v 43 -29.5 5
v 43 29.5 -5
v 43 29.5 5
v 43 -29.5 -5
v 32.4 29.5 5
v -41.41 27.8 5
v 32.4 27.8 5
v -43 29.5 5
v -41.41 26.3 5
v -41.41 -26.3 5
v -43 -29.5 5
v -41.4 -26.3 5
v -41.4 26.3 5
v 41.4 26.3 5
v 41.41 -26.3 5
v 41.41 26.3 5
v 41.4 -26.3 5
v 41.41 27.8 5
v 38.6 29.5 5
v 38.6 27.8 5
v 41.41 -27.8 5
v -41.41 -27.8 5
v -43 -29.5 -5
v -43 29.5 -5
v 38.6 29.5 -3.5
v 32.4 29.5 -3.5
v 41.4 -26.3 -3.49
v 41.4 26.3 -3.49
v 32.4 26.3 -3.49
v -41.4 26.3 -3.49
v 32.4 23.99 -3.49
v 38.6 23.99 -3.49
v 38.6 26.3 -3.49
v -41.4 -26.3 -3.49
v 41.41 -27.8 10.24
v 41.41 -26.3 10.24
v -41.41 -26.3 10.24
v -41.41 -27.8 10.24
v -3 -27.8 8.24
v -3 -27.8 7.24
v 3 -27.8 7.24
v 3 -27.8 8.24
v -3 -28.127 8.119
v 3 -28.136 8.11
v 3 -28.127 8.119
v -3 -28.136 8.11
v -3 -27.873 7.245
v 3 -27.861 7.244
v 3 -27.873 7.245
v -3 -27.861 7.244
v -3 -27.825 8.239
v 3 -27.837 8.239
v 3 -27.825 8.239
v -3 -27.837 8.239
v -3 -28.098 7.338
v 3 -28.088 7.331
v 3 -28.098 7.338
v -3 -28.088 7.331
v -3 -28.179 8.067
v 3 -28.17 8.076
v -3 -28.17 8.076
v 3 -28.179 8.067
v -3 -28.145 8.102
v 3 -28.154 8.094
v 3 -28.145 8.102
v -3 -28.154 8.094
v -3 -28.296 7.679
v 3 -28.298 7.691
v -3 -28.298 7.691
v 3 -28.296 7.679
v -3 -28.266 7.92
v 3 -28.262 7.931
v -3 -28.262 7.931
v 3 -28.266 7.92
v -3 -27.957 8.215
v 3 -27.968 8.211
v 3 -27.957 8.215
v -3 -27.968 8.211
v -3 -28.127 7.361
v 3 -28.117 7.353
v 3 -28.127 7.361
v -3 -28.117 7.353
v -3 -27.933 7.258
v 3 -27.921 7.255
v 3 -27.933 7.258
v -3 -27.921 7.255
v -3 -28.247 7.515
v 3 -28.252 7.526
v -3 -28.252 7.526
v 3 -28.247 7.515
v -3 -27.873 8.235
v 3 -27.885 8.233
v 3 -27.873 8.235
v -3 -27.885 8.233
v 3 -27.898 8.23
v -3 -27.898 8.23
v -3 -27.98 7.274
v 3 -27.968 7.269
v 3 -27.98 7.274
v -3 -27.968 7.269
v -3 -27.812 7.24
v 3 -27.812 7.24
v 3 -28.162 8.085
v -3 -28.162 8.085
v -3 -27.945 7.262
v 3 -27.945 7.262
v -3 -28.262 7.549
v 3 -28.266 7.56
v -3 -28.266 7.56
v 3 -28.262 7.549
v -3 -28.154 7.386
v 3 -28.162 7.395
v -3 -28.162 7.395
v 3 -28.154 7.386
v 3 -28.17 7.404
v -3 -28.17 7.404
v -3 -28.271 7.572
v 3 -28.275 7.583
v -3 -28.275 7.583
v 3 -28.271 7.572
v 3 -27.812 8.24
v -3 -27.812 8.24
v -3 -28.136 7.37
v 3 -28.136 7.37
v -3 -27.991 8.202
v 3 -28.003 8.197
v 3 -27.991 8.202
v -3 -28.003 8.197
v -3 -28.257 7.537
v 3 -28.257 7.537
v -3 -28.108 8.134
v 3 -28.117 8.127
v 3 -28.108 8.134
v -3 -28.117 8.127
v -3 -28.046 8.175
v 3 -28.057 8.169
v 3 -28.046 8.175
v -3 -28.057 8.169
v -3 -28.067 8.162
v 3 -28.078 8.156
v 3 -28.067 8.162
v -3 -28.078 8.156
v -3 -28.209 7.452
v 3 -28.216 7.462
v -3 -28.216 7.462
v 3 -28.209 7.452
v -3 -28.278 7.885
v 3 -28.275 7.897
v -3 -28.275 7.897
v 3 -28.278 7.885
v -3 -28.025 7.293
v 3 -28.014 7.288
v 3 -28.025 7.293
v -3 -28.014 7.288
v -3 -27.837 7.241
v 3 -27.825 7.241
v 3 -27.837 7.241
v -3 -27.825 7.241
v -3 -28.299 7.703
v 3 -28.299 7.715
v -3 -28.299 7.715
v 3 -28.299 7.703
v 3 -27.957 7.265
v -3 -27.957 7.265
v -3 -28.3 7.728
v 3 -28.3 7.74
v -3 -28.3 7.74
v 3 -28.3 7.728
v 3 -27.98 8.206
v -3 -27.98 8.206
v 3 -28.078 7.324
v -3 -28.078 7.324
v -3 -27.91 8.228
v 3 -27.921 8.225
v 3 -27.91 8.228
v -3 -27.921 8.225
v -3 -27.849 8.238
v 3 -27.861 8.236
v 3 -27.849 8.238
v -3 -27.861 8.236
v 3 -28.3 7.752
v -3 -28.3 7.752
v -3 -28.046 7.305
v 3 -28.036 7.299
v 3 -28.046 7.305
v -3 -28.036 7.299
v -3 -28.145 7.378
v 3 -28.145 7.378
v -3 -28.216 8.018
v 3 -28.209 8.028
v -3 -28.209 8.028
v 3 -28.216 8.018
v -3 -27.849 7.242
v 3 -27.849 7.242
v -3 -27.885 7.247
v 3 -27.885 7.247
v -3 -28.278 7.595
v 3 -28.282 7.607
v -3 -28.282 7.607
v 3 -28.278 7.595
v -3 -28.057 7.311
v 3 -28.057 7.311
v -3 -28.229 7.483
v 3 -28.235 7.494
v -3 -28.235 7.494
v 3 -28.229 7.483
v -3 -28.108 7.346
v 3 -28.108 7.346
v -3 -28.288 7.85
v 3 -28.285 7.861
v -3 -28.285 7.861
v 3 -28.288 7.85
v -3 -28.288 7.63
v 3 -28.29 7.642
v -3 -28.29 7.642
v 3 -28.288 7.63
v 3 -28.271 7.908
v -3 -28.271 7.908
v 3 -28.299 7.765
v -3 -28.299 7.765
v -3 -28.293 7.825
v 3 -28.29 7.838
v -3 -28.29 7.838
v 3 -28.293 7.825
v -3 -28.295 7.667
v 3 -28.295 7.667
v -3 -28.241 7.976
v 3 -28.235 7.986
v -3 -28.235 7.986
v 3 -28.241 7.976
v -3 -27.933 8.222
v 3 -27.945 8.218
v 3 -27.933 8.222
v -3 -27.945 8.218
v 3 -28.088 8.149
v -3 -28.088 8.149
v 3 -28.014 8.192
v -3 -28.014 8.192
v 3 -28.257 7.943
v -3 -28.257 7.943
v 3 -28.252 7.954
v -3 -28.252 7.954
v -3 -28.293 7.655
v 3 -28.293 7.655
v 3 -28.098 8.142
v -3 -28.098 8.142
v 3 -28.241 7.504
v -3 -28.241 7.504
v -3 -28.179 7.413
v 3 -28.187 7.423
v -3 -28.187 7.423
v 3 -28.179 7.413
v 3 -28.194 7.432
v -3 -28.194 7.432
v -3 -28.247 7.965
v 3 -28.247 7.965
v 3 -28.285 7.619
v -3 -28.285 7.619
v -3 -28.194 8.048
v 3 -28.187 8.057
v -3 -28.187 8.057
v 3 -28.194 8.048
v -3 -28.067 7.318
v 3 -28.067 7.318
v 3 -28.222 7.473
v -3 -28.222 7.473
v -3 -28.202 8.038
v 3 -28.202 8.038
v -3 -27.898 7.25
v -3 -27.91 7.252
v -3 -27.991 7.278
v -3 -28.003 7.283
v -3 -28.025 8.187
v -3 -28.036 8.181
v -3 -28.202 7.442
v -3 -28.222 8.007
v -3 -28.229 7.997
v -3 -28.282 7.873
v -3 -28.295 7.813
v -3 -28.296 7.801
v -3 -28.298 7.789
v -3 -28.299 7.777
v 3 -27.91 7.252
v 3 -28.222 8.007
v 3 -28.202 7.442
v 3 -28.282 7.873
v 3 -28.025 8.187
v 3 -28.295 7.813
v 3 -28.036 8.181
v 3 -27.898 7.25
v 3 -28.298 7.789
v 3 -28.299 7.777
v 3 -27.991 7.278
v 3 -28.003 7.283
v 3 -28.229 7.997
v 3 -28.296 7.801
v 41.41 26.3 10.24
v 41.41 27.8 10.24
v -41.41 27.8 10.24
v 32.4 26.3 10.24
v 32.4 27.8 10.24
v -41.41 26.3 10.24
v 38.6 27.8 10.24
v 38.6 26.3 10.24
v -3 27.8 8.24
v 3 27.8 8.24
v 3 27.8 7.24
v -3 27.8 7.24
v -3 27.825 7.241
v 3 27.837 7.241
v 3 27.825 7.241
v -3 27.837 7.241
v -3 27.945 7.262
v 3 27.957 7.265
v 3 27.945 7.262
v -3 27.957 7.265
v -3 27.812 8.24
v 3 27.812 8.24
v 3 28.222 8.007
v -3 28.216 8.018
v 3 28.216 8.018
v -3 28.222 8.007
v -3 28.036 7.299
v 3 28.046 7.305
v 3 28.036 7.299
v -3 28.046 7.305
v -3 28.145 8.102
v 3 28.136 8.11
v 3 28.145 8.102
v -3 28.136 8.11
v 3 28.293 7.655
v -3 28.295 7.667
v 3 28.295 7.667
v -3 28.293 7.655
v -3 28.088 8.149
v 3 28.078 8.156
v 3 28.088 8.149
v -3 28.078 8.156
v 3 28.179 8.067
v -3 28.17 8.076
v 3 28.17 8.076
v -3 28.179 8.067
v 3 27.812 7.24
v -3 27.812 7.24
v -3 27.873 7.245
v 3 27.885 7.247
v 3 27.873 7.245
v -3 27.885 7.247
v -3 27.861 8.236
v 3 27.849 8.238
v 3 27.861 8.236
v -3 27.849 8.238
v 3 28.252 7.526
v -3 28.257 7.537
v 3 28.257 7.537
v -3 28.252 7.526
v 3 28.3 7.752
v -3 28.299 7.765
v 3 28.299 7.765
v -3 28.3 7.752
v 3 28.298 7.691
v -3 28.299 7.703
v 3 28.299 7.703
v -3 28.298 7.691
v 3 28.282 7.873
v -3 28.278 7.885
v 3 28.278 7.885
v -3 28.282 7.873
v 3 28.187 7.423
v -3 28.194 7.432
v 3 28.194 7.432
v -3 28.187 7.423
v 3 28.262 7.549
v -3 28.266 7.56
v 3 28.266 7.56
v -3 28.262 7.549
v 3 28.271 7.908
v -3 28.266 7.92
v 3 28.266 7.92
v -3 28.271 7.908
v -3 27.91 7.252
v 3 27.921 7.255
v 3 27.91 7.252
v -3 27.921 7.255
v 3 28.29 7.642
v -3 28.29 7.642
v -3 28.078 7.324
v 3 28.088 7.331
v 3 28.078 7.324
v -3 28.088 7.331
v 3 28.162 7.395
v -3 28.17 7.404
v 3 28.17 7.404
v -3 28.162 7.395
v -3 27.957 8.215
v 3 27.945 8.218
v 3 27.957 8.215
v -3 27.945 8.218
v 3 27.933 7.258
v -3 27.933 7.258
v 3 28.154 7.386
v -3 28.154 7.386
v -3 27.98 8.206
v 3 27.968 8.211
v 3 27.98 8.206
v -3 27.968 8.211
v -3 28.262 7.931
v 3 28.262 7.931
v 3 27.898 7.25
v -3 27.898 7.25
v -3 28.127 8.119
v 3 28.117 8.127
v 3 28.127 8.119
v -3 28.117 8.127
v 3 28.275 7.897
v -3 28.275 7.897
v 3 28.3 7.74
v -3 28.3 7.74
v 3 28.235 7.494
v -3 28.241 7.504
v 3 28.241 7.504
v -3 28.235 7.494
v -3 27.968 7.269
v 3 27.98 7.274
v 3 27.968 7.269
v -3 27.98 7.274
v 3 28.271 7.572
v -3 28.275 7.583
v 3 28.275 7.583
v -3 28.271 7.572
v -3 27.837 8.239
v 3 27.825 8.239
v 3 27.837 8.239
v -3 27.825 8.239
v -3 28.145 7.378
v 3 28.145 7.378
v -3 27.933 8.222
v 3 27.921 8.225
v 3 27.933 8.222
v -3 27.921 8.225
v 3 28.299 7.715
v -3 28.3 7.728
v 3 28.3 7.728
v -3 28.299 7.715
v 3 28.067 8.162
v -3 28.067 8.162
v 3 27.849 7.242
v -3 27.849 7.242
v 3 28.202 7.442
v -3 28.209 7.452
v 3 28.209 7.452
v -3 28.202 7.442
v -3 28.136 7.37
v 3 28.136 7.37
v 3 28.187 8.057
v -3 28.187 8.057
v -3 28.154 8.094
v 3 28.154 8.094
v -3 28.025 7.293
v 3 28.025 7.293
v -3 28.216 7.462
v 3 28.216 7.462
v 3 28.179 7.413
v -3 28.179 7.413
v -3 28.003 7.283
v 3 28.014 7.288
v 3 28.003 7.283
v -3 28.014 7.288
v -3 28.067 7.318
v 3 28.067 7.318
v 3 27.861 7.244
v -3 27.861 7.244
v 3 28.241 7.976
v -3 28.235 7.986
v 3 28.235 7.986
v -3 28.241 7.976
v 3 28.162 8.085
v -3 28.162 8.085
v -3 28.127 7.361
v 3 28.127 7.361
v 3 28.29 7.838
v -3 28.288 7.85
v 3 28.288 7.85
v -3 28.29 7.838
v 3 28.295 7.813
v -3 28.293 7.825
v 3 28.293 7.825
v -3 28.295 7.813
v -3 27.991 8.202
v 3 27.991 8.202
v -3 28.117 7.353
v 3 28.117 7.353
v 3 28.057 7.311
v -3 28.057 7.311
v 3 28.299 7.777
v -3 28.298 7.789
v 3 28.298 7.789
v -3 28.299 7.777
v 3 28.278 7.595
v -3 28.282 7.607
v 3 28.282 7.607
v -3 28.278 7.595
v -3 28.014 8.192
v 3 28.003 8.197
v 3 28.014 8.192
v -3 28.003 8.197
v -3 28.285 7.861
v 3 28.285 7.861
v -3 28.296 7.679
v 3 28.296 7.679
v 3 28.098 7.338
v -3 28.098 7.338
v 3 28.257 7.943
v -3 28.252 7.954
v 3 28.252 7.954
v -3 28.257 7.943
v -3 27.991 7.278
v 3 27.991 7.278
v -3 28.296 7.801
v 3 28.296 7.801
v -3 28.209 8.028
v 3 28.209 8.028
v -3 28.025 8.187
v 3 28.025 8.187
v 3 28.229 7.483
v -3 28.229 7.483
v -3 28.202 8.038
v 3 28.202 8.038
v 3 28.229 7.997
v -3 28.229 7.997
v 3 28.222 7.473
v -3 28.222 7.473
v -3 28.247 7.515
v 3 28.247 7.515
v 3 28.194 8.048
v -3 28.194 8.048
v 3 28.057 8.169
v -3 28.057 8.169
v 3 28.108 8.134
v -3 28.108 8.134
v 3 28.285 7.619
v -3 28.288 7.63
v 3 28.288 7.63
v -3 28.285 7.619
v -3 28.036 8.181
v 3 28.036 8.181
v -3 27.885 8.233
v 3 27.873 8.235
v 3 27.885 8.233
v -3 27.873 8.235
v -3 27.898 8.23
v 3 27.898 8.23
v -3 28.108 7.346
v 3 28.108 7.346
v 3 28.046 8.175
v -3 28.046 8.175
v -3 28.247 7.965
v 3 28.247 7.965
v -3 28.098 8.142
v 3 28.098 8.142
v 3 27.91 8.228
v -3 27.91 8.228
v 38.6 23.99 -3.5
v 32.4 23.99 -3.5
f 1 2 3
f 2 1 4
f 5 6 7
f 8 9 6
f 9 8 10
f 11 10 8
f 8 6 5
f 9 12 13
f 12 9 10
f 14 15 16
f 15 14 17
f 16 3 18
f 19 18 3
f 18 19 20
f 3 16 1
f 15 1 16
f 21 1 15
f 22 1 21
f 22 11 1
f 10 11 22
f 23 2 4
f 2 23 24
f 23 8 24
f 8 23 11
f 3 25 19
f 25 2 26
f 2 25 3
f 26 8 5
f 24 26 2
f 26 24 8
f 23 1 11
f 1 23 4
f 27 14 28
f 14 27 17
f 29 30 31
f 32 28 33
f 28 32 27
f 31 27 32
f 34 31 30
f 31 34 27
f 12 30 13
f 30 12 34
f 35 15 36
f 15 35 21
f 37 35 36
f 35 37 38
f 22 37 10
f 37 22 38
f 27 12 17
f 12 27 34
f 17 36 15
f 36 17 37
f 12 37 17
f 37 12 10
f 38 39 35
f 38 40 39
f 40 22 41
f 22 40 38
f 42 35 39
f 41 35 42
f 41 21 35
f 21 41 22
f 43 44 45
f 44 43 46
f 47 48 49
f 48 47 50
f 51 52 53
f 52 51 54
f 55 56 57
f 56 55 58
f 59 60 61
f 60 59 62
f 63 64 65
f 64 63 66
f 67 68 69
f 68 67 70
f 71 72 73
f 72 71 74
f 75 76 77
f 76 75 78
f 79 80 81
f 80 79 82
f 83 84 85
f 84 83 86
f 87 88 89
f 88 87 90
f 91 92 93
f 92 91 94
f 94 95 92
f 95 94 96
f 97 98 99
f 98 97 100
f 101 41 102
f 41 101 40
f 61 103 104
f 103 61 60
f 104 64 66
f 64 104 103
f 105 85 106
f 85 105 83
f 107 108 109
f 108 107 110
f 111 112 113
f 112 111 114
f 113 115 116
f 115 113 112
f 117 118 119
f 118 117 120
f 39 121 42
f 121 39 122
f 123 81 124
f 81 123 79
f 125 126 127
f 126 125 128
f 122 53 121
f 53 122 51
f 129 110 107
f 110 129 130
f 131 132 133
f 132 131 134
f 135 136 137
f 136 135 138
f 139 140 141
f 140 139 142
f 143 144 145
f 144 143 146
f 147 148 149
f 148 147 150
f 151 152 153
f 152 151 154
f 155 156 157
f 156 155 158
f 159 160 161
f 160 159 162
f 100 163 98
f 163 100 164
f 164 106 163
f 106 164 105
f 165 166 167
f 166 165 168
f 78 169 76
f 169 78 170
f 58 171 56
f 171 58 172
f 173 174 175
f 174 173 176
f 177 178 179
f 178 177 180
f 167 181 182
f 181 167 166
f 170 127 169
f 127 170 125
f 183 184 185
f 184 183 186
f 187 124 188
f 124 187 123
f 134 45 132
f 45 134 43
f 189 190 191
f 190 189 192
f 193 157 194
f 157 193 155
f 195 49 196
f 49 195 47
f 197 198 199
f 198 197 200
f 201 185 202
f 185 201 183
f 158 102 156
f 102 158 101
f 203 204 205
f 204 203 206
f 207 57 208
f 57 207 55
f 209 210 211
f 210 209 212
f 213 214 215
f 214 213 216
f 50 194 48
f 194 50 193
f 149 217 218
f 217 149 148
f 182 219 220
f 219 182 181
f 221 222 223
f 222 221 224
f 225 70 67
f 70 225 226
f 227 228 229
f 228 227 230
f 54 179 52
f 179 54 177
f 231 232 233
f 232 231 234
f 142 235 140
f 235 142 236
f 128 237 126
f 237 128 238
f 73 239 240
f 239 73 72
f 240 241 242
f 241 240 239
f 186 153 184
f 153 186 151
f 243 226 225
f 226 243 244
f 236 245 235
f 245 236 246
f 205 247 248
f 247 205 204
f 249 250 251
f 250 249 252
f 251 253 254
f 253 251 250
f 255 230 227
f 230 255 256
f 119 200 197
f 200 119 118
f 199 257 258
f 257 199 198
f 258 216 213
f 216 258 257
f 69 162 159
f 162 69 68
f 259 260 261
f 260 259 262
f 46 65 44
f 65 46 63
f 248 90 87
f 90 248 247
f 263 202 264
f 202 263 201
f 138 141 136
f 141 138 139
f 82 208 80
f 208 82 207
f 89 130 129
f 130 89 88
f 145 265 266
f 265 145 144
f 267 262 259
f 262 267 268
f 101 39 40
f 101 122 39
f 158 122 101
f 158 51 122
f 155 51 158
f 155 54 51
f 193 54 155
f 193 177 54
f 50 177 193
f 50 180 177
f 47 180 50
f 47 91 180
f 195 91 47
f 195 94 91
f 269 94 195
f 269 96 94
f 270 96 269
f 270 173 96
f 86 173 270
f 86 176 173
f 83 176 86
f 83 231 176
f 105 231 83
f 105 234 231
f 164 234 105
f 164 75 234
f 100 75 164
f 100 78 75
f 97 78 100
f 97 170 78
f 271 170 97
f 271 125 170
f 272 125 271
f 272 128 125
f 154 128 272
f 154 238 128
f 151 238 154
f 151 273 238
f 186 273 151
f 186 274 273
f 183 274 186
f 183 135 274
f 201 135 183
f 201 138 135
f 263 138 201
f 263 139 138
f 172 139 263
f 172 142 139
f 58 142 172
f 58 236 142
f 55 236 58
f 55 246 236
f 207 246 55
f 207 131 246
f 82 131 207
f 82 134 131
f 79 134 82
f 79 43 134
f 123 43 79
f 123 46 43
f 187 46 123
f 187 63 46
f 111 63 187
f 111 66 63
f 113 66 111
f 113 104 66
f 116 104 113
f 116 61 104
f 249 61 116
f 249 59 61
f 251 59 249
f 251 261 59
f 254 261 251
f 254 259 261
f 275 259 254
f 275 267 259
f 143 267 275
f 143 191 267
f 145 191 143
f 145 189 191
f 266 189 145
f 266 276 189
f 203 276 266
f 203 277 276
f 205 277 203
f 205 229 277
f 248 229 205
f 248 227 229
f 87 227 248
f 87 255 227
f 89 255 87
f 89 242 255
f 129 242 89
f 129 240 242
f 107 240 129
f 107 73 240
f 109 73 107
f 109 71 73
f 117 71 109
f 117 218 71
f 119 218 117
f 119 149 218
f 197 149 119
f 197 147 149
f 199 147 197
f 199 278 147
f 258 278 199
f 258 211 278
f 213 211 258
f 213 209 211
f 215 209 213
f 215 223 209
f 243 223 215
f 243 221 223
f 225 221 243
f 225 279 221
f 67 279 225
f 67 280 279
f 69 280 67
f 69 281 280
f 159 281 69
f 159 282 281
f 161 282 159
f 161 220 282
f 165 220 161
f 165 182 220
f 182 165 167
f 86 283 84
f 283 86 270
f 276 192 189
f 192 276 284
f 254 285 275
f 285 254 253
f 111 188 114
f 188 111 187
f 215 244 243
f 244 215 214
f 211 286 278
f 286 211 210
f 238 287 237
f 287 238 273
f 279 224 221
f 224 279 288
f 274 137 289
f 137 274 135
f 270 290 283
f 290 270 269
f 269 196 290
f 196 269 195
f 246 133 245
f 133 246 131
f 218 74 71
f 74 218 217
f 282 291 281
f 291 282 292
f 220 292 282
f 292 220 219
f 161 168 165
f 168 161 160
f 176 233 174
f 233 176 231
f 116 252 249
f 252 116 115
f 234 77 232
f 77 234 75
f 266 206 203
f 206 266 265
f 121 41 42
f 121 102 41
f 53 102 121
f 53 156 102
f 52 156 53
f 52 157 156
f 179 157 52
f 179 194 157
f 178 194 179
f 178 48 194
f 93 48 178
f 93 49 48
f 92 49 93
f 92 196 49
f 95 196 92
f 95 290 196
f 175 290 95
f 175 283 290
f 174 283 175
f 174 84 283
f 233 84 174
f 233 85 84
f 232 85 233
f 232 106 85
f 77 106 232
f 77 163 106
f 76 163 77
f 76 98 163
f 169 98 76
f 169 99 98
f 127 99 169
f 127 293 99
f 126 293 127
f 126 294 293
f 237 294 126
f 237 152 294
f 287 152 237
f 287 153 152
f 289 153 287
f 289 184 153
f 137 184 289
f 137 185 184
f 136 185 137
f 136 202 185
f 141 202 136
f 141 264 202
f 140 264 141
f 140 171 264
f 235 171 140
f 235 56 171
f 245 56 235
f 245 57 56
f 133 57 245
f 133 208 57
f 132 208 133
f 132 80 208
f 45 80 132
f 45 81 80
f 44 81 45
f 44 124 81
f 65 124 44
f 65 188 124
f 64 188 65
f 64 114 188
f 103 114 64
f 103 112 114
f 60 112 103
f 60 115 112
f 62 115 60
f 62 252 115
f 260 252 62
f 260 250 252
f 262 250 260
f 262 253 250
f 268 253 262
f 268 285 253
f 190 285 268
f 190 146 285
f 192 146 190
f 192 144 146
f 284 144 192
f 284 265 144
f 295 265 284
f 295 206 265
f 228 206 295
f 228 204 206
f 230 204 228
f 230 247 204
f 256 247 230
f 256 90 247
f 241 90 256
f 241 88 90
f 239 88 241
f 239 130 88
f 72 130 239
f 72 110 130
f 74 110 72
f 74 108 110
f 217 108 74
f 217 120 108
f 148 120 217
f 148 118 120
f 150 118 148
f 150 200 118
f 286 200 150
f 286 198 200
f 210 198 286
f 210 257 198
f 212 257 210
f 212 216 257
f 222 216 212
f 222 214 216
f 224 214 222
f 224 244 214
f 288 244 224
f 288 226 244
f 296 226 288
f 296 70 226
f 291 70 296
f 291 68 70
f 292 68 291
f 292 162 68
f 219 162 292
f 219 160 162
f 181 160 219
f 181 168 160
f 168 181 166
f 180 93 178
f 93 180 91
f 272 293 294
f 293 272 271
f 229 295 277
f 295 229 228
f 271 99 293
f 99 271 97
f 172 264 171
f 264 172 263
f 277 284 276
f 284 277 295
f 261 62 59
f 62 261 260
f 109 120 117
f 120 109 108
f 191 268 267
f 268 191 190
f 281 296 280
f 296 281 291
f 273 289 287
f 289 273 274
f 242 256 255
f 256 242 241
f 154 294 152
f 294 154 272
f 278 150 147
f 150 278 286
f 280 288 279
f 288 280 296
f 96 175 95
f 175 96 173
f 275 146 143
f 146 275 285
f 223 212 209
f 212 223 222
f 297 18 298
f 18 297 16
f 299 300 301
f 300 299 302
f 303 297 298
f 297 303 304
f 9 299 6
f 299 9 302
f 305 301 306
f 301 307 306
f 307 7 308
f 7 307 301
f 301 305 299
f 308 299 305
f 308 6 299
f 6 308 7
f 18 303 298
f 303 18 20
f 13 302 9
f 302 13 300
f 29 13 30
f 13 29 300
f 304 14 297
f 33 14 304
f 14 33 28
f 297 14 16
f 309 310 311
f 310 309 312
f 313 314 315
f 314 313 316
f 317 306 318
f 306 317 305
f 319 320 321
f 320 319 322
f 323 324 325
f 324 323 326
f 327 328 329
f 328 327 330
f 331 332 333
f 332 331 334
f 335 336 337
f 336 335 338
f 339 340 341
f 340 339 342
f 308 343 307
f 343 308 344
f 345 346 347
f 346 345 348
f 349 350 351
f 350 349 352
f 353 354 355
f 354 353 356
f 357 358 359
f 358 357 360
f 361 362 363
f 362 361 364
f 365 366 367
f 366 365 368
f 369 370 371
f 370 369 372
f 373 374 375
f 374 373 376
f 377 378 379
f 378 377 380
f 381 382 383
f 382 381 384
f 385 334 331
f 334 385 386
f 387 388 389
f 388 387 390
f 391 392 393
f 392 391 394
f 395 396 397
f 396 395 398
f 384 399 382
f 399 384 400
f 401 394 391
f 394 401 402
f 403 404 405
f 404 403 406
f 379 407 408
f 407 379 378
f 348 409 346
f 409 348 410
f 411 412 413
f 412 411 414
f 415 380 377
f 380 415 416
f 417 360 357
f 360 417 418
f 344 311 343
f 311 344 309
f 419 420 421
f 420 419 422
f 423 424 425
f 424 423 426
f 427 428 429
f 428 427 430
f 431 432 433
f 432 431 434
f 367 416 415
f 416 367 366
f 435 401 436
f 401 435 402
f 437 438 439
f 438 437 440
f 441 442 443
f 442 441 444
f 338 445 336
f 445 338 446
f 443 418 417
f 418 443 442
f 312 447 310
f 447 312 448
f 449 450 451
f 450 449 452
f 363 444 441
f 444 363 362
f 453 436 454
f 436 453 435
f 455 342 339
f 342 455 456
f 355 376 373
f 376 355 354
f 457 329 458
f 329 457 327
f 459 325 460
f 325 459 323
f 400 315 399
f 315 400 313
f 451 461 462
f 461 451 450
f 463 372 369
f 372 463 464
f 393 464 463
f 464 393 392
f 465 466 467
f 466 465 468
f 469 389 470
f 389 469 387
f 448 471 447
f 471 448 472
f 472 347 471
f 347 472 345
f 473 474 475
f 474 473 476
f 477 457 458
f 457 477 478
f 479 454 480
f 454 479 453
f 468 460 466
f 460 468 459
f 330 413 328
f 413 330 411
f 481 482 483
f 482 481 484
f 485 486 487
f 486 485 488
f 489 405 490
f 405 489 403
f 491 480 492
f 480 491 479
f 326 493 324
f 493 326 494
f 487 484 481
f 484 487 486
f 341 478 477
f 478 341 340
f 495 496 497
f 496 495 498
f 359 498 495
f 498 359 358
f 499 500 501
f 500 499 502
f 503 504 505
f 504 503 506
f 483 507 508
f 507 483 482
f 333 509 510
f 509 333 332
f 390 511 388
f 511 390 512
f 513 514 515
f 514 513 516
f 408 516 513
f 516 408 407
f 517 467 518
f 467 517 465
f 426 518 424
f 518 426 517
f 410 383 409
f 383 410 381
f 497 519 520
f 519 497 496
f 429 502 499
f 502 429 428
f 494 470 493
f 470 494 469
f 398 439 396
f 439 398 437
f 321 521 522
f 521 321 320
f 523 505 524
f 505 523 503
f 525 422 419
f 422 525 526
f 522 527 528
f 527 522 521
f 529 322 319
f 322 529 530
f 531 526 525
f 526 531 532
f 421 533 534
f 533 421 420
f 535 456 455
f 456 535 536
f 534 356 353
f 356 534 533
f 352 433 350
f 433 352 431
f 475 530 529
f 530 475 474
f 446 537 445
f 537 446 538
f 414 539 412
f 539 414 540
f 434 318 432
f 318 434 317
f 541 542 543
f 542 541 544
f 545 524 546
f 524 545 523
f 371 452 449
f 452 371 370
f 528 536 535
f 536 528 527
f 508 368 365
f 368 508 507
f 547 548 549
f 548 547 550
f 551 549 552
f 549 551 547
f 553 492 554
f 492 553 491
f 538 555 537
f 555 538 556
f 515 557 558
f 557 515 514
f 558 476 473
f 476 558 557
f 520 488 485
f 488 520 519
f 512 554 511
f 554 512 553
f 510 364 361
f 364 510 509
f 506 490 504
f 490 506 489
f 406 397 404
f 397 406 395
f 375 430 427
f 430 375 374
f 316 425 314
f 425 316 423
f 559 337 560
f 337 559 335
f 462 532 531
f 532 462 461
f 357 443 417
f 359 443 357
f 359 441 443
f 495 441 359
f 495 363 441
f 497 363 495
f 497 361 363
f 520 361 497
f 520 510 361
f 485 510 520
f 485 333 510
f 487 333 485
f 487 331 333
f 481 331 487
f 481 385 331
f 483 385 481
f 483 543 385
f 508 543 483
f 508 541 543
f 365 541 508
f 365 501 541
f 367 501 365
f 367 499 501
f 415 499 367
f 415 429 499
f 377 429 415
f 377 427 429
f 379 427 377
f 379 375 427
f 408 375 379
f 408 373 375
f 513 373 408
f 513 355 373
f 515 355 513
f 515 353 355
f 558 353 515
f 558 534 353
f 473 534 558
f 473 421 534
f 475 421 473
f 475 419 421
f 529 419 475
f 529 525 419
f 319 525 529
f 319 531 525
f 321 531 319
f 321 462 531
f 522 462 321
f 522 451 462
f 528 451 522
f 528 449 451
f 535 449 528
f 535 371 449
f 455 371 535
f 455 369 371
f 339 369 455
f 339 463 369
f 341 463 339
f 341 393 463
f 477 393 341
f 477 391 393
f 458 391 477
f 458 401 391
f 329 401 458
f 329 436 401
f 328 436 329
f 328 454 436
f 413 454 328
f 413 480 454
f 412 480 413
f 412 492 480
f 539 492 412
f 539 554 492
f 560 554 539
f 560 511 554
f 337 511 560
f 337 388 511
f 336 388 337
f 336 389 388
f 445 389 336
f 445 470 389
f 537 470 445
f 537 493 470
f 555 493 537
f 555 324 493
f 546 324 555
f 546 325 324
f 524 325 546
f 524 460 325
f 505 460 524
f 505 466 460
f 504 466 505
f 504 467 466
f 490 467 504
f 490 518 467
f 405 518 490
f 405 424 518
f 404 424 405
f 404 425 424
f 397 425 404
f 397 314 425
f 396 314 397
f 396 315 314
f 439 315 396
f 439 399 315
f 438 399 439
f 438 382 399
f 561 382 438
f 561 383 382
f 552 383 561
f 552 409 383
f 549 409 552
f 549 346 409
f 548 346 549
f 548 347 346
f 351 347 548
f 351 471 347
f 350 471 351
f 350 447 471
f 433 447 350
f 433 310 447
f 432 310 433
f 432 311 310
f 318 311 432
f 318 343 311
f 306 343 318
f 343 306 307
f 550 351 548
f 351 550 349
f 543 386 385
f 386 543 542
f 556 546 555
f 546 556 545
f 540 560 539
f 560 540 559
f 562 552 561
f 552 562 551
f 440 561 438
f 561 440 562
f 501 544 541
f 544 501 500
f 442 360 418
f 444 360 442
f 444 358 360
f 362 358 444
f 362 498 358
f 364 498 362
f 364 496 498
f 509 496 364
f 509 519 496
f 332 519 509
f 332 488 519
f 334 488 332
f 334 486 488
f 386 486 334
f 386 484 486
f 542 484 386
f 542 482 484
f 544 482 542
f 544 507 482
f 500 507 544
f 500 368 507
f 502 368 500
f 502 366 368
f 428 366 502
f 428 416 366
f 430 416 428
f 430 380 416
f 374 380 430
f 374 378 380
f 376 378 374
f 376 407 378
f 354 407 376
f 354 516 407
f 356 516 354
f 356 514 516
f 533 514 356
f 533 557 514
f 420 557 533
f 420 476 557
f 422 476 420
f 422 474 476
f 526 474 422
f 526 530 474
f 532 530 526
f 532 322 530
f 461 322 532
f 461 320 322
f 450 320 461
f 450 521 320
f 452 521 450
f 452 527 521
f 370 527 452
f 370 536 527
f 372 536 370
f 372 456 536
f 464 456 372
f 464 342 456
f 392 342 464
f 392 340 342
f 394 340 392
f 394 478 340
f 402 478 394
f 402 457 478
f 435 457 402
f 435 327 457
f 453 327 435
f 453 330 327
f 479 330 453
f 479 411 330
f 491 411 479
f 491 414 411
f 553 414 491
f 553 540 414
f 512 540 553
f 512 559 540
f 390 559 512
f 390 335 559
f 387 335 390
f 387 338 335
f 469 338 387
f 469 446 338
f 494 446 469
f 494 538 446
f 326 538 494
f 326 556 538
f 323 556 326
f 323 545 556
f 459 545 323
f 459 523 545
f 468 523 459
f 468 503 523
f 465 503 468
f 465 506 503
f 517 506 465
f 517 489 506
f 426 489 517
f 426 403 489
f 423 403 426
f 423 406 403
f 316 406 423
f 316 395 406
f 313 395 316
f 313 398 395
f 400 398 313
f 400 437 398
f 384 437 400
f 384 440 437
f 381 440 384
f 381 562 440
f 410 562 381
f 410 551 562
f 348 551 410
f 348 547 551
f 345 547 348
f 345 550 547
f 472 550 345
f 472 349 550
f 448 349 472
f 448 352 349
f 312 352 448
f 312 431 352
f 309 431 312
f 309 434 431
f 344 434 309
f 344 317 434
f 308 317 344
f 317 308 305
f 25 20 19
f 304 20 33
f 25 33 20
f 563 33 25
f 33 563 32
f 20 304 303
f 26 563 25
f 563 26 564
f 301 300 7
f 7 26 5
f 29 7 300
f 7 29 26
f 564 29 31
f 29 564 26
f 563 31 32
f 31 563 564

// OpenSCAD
/*
 * A box for the Binkey binary keyboard. You'll need one bottom and one top. Duh.
 * Just uncomment one at a time at the bottom of the file, render and export to STL.
 * 
 * Copyright (c) 2020, Hans Liss
 * 
 * Redistribution and use in source and binary forms, with or without
 * modification, are permitted provided that the following conditions are met:
 * 
 * 1. Redistributions of source code must retain the above copyright notice, this
 *    list of conditions and the following disclaimer.
 * 2. Redistributions in binary form must reproduce the above copyright notice,
 *    this list of conditions and the following disclaimer in the documentation
 *    and/or other materials provided with the distribution.
 * 
 * THIS SOFTWARE IS PROVIDED BY THE COPYRIGHT HOLDERS AND CONTRIBUTORS "AS IS" AND
 * ANY EXPRESS OR IMPLIED WARRANTIES, INCLUDING, BUT NOT LIMITED TO, THE IMPLIED
 * WARRANTIES OF MERCHANTABILITY AND FITNESS FOR A PARTICULAR PURPOSE ARE
 * DISCLAIMED. IN NO EVENT SHALL THE COPYRIGHT OWNER OR CONTRIBUTORS BE LIABLE FOR
 * ANY DIRECT, INDIRECT, INCIDENTAL, SPECIAL, EXEMPLARY, OR CONSEQUENTIAL DAMAGES
 * (INCLUDING, BUT NOT LIMITED TO, PROCUREMENT OF SUBSTITUTE GOODS OR SERVICES;
 * LOSS OF USE, DATA, OR PROFITS; OR BUSINESS INTERRUPTION) HOWEVER CAUSED AND
 * ON ANY THEORY OF LIABILITY, WHETHER IN CONTRACT, STRICT LIABILITY, OR TORT
 * (INCLUDING NEGLIGENCE OR OTHERWISE) ARISING IN ANY WAY OUT OF THE USE OF THIS
 * SOFTWARE, EVEN IF ADVISED OF THE POSSIBILITY OF SUCH DAMAGE.
 */
 
 $fn=256;

capWidthBase=18;
capHeightBase=18;
capWidthEnter=capWidthBase;
capHeightEnter=37;
capWidthBackspace=37;
capHeightBackspace=capHeightBase;
capGap=(capWidthBackspace - 2 * capWidthBase);

key0PosX=capWidthBase / 2;
key0PosY=capHeightBase / 2;
key1PosX=key0PosX + capWidthBase + capGap;
key1PosY=key0PosY;
keyEnterPosX=key1PosX + capWidthBase + capGap;
keyEnterPosY=capHeightEnter / 2;
keyBackspacePosX = capWidthBackspace / 2;
keyBackspacePosY = key0PosY + capHeightBase + capGap;

totKeyCenterDistX = keyEnterPosX - key0PosX;
totKeyCenterDistY = keyBackspacePosY - key0PosY;

edge = 5;
keyOffsetX = 10;
keyOffsetY = edge + 7;

boxWidth=totKeyCenterDistX + capWidthBase + 2 * edge + keyOffsetX + 10;
boxLength=totKeyCenterDistY + capHeightBase + 2 * edge + keyOffsetY;
boxHeight=20;
wallThickness=1.5;


keyHoleWidth=14;
keyHoleLength=14;

notchHeight=4;
botHeight=10;

module top() {
    difference() {
        cube([boxWidth, boxLength, boxHeight], center=true);
        translate([0, 0, -wallThickness/2 - 0.01])
            cube([boxWidth - 2*wallThickness, boxLength - 2*wallThickness, boxHeight - wallThickness + 0.02], center=true);
        translate([edge + keyOffsetX + key0PosX - boxWidth/2, -edge - keyOffsetY - key0PosY + boxLength/2, boxHeight/2 - wallThickness/2])
            cube([keyHoleWidth, keyHoleLength, wallThickness + 0.02], center=true);
        translate([edge + keyOffsetX + key1PosX - boxWidth/2, -edge - keyOffsetY - key1PosY + boxLength/2, boxHeight/2 - wallThickness/2])
            cube([keyHoleWidth, keyHoleLength, wallThickness + 0.02], center=true);
        translate([edge + keyOffsetX + keyEnterPosX - boxWidth/2, -edge - keyOffsetY - keyEnterPosY + boxLength/2, boxHeight/2 - wallThickness/2])
            cube([keyHoleWidth, keyHoleLength, wallThickness + 0.02], center=true);
        translate([edge + keyOffsetX + keyBackspacePosX - boxWidth/2, -edge - keyOffsetY - keyBackspacePosY + boxLength/2, boxHeight/2 - wallThickness/2])
            cube([keyHoleWidth, keyHoleLength, wallThickness + 0.02], center=true);

        for (led = [0 : 1 : 7]) {
            translate([led * 9 + 9/2 + (boxWidth - (8 * 9))/2 - boxWidth/2, -edge + boxLength/2, boxHeight/2 - wallThickness - 0.01])
                cylinder(r = 3.4, h=wallThickness + 0.02);
        } 

        // translate([0, 0, -(boxHeight/2 - wallThickness/2)])
        //    cube([boxWidth + 0.02, boxLength + 0.02, wallThickness + 0.02], center=true);
        translate([-4, boxLength/2 - wallThickness, - (boxHeight/2 - notchHeight)])
            rotate([0, 90, 0])
                cylinder(r=0.75, h=8);
        translate([-4, -(boxLength/2 - wallThickness), - (boxHeight/2 - notchHeight)])
            rotate([0, 90, 0])
                cylinder(r=0.75, h=8);
        translate([boxWidth / 2 - wallThickness - 12/2, boxLength / 2 - wallThickness - 0.01, 12/2 - boxHeight/2 - (botHeight - wallThickness)])
            cube([6.2, 8, 12], center = true);
    }
}

module bottom() {
    difference() {
        union() {
            difference() {
                cube([boxWidth, boxLength, botHeight], center = true);
                translate([0, 0, wallThickness/2 + 0.01])
                    cube([boxWidth - 2 * wallThickness - 0.2, boxLength - 2 * wallThickness - 0.2, botHeight - wallThickness], center = true);
            }
            translate([0, -(boxLength/2 - wallThickness) + wallThickness/2 - 0.2, wallThickness/2])
                cube([boxWidth - 2 * wallThickness - 0.2 + 0.02, wallThickness + 0.2, botHeight - wallThickness], center=true);
            translate([0, -(boxLength/2 - wallThickness) + wallThickness/2 + 0.2, (notchHeight + 2)/2 - 0.01])
                union() {
                    cube([boxWidth - 2 * wallThickness - 0.2 + 0.02, wallThickness, notchHeight + 2 + botHeight - wallThickness], center=true);
                    translate([-6/2, -wallThickness/2, (botHeight - 2) + notchHeight - (notchHeight + 2 + (botHeight - wallThickness))/2])
                        rotate([0, 90, 0])
                            cylinder(r=0.5, h=6);
                }
            translate([0, (boxLength/2 - wallThickness) - wallThickness/2 + 0.2, wallThickness/2])
                cube([boxWidth - 2 * wallThickness - 0.2 + 0.02, wallThickness + 0.2, botHeight - wallThickness], center=true);
            translate([0, (boxLength/2 - wallThickness) - wallThickness/2  - 0.2, (notchHeight + 2)/2 - 0.01])
                union() {
                    cube([boxWidth - 2*wallThickness -0.2 + 0.02, wallThickness, notchHeight + 2 + botHeight - wallThickness], center=true);
                    translate([-6/2, wallThickness/2, (botHeight - 2) + notchHeight - (notchHeight + 2 + (botHeight - wallThickness))/2])
                        rotate([0, 90, 0])
                            cylinder(r=0.5, h=6);
                }
        }
        translate([boxWidth / 2 - wallThickness - 12/2, boxLength / 2 - wallThickness - 0.01, wallThickness + 12/2 - botHeight/2])
            cube([6.2, 8, 12], center = true);
        // Need to remove the top of the cable slot
        translate([boxWidth / 2 - wallThickness - 12/2, boxLength / 2 - wallThickness - 0.01, wallThickness + 12 + 12/2 - botHeight/2 - 0.01])
            cube([6.2, 8, 12], center = true);
   }
}


//translate([0, 0, 30])
//    top();
bottom();
